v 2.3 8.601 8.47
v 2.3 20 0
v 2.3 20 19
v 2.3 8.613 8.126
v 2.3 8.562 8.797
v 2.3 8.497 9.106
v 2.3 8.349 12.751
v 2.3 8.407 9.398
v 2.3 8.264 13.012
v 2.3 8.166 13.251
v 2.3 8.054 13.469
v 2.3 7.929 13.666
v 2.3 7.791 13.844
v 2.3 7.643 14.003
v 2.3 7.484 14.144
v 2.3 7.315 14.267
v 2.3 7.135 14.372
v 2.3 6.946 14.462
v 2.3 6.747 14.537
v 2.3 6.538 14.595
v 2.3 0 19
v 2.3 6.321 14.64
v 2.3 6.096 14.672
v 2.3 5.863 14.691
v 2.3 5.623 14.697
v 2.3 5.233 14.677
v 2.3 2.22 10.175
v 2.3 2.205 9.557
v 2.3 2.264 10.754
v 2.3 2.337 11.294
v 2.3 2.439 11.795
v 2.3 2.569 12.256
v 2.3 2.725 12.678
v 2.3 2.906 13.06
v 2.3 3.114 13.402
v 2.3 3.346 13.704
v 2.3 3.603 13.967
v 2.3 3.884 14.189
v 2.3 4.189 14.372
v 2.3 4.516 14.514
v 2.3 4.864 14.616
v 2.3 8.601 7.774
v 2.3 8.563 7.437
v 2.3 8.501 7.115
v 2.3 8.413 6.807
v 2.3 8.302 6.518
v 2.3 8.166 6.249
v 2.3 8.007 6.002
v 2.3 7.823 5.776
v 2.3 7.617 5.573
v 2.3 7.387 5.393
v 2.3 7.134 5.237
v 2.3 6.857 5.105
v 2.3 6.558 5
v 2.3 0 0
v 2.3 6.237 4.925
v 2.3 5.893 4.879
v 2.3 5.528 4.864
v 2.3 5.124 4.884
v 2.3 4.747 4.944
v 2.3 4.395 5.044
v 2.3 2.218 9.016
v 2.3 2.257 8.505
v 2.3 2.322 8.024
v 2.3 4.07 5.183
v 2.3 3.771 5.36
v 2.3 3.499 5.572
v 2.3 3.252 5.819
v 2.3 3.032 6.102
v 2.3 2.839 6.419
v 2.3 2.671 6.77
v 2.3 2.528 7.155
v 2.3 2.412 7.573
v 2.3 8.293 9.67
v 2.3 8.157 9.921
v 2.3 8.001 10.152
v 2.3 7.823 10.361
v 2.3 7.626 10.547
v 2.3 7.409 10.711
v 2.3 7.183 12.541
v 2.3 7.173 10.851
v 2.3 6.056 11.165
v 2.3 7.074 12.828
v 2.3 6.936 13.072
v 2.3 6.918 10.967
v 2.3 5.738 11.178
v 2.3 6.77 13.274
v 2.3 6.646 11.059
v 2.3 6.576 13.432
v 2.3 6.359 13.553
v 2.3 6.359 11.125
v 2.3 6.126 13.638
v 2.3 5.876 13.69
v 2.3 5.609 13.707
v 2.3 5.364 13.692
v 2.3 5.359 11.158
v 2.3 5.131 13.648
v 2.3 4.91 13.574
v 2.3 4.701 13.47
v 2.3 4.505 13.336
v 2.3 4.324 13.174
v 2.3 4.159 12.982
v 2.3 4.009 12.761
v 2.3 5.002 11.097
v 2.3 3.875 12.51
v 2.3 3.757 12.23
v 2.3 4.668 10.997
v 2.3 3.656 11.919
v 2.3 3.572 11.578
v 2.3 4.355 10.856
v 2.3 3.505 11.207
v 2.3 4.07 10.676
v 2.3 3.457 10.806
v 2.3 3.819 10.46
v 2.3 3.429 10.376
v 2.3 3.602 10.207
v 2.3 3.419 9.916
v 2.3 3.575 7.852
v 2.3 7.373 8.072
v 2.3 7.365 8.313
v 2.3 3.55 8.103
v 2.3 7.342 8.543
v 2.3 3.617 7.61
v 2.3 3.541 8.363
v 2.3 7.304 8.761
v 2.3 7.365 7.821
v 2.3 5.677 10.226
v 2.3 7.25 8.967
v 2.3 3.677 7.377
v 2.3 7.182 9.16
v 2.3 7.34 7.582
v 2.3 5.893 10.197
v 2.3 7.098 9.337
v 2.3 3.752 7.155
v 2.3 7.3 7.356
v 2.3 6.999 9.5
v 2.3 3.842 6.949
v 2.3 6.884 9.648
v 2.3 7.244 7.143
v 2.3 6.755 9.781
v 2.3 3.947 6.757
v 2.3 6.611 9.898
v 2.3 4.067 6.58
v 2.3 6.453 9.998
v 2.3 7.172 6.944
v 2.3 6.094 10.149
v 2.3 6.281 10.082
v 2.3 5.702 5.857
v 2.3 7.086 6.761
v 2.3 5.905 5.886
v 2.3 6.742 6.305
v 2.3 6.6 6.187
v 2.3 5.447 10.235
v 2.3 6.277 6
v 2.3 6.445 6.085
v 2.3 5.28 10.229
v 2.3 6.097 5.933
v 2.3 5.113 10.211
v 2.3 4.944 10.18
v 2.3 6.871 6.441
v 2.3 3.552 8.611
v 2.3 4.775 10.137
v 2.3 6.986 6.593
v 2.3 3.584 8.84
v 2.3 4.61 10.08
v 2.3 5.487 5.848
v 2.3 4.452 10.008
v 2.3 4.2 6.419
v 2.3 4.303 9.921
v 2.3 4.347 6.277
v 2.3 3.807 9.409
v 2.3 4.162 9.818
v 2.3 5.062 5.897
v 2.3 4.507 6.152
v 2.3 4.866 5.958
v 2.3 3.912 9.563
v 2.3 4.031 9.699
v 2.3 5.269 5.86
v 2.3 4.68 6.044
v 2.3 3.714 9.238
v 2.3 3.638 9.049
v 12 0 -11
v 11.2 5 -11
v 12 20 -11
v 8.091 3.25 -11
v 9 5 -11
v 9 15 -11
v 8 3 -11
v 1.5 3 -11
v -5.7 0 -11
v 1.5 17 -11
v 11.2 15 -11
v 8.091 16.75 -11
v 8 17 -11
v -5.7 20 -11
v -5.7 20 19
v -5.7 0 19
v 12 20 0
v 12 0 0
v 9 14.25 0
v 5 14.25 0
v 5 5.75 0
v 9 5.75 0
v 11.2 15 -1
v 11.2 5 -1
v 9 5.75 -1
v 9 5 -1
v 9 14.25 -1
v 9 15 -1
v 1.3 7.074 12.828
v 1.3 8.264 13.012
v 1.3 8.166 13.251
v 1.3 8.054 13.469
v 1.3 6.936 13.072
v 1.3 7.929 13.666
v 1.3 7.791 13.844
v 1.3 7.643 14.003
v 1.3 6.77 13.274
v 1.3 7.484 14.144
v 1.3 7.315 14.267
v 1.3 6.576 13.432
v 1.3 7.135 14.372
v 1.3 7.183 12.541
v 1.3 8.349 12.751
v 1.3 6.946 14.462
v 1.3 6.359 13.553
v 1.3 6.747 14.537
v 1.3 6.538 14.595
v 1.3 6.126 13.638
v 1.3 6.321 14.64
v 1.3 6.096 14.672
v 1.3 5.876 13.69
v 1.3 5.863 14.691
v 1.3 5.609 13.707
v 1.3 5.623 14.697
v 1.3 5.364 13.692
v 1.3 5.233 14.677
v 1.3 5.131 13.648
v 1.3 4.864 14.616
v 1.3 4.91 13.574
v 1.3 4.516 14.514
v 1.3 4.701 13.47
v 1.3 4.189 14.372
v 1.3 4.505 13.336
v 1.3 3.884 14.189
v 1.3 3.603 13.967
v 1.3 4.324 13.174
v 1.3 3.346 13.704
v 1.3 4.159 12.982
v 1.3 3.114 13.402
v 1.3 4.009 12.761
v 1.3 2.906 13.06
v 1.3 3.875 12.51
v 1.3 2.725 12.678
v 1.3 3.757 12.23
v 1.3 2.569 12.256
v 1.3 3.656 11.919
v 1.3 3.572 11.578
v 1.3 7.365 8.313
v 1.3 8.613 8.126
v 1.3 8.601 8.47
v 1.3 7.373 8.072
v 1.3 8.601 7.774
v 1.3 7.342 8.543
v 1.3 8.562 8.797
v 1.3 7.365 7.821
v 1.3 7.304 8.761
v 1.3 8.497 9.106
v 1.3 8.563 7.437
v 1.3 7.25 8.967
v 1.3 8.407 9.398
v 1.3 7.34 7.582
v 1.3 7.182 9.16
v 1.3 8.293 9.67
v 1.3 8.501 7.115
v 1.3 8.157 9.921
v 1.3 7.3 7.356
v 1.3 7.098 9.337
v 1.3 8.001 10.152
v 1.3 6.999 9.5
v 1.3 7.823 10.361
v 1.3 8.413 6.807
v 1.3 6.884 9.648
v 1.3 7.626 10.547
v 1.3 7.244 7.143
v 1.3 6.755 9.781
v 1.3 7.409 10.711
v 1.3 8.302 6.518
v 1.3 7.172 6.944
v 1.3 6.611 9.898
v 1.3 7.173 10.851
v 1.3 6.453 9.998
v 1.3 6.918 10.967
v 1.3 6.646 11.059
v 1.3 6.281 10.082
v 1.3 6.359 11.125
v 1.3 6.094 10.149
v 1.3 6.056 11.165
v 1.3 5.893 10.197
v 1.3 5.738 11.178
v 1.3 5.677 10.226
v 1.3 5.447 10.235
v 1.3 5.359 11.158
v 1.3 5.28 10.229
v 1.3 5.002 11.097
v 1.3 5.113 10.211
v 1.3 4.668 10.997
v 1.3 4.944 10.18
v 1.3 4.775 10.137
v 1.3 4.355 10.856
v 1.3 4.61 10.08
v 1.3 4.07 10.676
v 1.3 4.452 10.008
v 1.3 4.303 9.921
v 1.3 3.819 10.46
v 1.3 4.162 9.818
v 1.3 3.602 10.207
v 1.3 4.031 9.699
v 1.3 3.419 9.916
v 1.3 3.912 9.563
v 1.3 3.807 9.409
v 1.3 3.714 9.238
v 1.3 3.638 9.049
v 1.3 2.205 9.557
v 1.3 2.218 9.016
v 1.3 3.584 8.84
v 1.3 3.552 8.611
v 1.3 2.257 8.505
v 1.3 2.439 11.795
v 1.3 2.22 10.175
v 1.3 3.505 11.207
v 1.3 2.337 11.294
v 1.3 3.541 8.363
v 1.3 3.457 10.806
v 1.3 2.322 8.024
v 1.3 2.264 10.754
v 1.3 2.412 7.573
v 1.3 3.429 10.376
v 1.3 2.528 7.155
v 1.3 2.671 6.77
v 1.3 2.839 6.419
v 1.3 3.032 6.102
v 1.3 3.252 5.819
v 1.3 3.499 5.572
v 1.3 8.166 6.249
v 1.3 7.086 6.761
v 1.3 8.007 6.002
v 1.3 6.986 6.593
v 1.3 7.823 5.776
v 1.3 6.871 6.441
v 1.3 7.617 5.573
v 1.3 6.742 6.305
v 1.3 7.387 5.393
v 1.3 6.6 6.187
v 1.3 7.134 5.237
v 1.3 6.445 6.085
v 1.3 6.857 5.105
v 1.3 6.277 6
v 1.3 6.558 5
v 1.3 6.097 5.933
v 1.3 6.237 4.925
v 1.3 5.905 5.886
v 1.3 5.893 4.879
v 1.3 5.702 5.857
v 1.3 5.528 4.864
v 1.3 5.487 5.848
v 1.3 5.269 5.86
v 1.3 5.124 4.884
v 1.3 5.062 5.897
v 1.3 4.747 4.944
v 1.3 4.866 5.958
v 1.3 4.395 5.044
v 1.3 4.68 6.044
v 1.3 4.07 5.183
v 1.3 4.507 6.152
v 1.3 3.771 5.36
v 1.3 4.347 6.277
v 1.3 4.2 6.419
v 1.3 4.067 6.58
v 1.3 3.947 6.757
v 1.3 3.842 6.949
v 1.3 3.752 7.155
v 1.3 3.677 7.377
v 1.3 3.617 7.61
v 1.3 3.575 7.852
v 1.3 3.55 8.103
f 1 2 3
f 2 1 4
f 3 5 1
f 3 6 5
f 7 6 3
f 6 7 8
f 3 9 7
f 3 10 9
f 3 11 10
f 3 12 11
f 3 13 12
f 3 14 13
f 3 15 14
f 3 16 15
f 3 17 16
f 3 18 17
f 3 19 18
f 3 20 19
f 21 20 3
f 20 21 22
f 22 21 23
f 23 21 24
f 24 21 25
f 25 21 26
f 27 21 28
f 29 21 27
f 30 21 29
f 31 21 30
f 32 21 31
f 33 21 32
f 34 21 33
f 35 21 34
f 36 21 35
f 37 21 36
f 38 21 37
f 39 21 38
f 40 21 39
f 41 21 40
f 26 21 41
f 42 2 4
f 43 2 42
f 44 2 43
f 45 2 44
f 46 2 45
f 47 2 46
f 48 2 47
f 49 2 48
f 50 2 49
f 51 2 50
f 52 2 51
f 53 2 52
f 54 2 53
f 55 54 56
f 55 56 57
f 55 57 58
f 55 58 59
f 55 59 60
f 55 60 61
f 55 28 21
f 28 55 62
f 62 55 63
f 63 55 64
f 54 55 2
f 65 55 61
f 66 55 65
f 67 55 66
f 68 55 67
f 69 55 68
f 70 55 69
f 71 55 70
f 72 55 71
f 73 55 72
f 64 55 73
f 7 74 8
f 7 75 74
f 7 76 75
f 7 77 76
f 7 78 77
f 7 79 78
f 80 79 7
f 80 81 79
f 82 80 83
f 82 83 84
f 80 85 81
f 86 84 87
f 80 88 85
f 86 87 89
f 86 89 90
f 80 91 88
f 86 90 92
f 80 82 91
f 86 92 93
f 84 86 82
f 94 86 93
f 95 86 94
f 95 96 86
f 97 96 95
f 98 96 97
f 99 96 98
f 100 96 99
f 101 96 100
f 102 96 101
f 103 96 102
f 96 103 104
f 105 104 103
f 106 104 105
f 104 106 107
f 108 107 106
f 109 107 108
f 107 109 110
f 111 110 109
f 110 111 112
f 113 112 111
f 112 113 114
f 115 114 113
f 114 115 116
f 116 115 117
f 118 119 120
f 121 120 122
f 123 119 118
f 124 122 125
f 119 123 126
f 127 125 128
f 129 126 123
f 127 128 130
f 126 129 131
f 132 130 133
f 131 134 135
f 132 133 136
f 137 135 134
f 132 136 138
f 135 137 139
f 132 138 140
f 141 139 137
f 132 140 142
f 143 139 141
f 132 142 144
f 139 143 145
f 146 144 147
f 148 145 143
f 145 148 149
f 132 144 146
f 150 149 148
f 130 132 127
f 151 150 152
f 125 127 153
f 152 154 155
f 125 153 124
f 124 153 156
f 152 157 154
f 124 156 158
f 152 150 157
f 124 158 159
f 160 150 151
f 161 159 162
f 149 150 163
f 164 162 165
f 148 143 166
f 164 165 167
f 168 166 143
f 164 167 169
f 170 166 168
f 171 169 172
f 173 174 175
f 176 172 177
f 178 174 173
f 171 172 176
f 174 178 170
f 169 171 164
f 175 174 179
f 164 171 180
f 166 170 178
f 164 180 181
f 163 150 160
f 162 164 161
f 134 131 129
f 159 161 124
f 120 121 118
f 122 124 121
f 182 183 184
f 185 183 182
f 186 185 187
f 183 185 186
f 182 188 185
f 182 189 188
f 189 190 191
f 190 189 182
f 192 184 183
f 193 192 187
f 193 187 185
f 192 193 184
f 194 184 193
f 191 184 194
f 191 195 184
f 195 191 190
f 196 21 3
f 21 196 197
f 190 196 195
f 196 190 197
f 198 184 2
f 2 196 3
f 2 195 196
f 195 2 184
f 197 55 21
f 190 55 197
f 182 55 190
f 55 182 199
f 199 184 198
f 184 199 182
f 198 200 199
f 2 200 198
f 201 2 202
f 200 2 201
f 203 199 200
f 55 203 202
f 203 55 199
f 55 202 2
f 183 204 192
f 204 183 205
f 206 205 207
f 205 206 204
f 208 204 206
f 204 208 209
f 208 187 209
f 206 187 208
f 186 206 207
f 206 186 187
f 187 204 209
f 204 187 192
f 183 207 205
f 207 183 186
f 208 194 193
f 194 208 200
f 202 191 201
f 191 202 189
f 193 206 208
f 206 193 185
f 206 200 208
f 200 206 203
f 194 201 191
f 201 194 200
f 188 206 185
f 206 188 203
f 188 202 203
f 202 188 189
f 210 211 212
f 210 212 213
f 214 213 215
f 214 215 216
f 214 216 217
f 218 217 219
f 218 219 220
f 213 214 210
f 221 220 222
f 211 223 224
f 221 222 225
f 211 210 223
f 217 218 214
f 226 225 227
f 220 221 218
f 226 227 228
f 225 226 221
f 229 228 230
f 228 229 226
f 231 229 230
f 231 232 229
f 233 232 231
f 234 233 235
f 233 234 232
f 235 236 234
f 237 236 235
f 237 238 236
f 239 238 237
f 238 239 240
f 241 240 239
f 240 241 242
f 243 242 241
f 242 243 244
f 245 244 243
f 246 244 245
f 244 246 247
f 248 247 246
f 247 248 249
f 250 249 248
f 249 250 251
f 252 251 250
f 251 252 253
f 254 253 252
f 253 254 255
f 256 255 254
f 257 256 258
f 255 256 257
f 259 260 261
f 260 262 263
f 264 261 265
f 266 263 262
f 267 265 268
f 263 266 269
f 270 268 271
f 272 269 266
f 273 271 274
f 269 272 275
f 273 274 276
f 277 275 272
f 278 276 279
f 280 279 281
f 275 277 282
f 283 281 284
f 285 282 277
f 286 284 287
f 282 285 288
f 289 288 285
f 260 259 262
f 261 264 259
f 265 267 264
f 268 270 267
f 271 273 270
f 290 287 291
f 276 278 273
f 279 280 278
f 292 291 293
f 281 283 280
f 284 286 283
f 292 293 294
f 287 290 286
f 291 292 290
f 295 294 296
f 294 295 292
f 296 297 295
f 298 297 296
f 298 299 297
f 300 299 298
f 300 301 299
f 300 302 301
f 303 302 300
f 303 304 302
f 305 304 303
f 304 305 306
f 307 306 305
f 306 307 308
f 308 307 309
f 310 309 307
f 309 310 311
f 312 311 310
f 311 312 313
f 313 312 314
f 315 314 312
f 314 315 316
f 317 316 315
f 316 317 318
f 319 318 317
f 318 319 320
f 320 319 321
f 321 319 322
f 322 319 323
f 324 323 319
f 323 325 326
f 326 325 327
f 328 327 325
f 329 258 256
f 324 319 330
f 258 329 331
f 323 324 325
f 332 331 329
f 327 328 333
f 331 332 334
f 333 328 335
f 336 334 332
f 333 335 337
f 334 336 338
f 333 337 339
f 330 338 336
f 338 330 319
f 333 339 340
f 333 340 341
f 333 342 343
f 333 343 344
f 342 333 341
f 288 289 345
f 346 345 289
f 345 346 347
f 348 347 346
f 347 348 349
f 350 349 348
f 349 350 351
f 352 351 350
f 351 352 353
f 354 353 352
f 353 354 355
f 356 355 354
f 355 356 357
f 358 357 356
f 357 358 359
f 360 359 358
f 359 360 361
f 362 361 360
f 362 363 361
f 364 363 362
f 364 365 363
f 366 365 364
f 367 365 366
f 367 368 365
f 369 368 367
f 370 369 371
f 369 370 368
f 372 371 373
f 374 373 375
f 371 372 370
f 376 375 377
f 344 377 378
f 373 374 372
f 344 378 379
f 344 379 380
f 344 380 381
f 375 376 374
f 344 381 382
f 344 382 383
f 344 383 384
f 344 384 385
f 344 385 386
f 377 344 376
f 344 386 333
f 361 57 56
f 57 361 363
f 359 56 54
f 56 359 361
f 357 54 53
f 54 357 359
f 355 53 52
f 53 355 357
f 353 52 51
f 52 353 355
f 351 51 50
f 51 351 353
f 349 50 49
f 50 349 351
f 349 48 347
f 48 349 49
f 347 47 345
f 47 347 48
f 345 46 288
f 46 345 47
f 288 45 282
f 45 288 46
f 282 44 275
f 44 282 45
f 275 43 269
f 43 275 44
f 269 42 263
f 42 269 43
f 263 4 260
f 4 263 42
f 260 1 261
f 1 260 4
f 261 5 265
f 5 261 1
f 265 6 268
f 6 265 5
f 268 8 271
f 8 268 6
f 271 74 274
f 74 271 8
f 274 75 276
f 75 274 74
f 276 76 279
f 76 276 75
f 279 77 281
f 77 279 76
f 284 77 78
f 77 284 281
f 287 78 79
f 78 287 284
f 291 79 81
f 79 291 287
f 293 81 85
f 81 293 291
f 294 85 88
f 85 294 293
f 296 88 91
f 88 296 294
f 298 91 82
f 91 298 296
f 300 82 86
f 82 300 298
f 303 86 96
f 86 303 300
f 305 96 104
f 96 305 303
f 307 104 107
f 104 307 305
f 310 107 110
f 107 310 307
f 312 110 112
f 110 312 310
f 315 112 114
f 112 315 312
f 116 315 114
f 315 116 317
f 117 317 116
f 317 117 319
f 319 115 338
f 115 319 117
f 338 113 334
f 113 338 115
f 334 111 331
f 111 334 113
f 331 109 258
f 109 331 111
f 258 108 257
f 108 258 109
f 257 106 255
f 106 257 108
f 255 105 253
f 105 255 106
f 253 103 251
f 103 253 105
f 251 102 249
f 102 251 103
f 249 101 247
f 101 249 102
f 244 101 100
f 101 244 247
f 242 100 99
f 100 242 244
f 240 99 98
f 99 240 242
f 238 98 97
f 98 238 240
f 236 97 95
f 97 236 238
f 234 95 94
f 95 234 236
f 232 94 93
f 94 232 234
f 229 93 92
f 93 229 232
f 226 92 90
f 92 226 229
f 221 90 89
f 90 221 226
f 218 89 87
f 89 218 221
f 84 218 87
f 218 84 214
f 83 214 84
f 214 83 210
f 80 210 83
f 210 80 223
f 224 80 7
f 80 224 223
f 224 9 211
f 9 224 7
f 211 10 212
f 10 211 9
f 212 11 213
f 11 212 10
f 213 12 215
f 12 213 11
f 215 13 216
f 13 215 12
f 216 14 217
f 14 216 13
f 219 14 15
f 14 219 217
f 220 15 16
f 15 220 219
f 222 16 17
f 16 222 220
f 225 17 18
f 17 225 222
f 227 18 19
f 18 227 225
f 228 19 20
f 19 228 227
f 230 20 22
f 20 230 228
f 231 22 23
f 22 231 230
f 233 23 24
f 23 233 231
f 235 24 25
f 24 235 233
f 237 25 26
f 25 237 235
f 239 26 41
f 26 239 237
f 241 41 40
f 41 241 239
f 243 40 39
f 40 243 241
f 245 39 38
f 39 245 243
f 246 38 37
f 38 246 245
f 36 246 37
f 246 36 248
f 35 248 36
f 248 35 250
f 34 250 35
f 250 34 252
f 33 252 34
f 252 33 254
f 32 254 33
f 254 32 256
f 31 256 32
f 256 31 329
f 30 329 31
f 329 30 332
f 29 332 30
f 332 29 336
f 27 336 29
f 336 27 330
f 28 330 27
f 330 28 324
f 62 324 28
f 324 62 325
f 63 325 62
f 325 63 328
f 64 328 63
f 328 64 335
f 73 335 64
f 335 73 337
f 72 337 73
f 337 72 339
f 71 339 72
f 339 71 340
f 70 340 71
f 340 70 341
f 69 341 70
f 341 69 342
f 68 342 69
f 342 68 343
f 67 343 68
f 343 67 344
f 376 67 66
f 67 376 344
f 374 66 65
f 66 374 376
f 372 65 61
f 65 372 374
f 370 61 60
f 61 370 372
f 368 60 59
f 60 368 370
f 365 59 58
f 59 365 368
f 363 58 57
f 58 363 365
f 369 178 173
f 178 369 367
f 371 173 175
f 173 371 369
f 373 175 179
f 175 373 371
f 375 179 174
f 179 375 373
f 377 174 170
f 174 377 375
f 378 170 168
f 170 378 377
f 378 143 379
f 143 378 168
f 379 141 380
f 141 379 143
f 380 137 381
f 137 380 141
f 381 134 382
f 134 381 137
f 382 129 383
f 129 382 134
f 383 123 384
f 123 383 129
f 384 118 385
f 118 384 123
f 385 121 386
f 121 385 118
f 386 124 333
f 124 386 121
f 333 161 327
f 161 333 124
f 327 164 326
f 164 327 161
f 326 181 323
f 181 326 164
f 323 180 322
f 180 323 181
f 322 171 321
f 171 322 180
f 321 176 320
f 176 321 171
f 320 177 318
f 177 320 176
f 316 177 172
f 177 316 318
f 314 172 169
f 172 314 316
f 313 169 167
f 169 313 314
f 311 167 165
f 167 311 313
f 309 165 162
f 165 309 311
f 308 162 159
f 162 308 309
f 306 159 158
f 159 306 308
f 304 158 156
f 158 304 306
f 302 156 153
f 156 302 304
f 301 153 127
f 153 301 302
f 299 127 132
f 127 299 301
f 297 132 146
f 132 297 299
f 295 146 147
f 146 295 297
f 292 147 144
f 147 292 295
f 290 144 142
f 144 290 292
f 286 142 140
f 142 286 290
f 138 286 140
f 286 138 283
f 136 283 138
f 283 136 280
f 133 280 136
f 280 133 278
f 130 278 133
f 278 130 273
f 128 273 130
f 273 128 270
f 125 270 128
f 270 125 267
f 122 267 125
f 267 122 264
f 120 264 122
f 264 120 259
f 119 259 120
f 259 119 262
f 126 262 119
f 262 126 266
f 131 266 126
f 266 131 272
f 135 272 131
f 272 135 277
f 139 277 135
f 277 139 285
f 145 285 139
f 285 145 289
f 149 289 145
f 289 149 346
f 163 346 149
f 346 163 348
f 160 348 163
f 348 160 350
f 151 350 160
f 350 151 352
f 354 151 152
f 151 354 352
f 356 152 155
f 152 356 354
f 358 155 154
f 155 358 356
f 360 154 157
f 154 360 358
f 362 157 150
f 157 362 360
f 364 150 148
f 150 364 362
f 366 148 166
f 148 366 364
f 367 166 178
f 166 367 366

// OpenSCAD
dist = 5.3;
material = 6;

basex1 = 12;
basex2 = 8;
basey = 20;
basez1 = 11;
basez2 = 30;

difference() {

  mirror([0,0,1])

    difference() {
      union() {

        translate([-(material/2-dist),0,0]) cube([(material/2-dist),basey,basez1]);
        translate([-basex2-(material/2-dist),0,-basez2+basez1]) cube([basex2,basey,basez2]);
        cube([basex1,basey,basez1]);
      }

      translate([9,5,1]) cube([2.2,10,10]);

      hull() {
        translate([5,(basey-8.5)/2,0]) cube([4,8.5,1]);
        translate([1.5,(basey-14)/2,basez1]) cube([6.5,14,1]);
      }

    }


  translate([-(material/2-dist)-1,1.5,5]) rotate([90,0,0]) rotate([0,90,0]) linear_extrude(1) text(text=str(material), size=10);


}
